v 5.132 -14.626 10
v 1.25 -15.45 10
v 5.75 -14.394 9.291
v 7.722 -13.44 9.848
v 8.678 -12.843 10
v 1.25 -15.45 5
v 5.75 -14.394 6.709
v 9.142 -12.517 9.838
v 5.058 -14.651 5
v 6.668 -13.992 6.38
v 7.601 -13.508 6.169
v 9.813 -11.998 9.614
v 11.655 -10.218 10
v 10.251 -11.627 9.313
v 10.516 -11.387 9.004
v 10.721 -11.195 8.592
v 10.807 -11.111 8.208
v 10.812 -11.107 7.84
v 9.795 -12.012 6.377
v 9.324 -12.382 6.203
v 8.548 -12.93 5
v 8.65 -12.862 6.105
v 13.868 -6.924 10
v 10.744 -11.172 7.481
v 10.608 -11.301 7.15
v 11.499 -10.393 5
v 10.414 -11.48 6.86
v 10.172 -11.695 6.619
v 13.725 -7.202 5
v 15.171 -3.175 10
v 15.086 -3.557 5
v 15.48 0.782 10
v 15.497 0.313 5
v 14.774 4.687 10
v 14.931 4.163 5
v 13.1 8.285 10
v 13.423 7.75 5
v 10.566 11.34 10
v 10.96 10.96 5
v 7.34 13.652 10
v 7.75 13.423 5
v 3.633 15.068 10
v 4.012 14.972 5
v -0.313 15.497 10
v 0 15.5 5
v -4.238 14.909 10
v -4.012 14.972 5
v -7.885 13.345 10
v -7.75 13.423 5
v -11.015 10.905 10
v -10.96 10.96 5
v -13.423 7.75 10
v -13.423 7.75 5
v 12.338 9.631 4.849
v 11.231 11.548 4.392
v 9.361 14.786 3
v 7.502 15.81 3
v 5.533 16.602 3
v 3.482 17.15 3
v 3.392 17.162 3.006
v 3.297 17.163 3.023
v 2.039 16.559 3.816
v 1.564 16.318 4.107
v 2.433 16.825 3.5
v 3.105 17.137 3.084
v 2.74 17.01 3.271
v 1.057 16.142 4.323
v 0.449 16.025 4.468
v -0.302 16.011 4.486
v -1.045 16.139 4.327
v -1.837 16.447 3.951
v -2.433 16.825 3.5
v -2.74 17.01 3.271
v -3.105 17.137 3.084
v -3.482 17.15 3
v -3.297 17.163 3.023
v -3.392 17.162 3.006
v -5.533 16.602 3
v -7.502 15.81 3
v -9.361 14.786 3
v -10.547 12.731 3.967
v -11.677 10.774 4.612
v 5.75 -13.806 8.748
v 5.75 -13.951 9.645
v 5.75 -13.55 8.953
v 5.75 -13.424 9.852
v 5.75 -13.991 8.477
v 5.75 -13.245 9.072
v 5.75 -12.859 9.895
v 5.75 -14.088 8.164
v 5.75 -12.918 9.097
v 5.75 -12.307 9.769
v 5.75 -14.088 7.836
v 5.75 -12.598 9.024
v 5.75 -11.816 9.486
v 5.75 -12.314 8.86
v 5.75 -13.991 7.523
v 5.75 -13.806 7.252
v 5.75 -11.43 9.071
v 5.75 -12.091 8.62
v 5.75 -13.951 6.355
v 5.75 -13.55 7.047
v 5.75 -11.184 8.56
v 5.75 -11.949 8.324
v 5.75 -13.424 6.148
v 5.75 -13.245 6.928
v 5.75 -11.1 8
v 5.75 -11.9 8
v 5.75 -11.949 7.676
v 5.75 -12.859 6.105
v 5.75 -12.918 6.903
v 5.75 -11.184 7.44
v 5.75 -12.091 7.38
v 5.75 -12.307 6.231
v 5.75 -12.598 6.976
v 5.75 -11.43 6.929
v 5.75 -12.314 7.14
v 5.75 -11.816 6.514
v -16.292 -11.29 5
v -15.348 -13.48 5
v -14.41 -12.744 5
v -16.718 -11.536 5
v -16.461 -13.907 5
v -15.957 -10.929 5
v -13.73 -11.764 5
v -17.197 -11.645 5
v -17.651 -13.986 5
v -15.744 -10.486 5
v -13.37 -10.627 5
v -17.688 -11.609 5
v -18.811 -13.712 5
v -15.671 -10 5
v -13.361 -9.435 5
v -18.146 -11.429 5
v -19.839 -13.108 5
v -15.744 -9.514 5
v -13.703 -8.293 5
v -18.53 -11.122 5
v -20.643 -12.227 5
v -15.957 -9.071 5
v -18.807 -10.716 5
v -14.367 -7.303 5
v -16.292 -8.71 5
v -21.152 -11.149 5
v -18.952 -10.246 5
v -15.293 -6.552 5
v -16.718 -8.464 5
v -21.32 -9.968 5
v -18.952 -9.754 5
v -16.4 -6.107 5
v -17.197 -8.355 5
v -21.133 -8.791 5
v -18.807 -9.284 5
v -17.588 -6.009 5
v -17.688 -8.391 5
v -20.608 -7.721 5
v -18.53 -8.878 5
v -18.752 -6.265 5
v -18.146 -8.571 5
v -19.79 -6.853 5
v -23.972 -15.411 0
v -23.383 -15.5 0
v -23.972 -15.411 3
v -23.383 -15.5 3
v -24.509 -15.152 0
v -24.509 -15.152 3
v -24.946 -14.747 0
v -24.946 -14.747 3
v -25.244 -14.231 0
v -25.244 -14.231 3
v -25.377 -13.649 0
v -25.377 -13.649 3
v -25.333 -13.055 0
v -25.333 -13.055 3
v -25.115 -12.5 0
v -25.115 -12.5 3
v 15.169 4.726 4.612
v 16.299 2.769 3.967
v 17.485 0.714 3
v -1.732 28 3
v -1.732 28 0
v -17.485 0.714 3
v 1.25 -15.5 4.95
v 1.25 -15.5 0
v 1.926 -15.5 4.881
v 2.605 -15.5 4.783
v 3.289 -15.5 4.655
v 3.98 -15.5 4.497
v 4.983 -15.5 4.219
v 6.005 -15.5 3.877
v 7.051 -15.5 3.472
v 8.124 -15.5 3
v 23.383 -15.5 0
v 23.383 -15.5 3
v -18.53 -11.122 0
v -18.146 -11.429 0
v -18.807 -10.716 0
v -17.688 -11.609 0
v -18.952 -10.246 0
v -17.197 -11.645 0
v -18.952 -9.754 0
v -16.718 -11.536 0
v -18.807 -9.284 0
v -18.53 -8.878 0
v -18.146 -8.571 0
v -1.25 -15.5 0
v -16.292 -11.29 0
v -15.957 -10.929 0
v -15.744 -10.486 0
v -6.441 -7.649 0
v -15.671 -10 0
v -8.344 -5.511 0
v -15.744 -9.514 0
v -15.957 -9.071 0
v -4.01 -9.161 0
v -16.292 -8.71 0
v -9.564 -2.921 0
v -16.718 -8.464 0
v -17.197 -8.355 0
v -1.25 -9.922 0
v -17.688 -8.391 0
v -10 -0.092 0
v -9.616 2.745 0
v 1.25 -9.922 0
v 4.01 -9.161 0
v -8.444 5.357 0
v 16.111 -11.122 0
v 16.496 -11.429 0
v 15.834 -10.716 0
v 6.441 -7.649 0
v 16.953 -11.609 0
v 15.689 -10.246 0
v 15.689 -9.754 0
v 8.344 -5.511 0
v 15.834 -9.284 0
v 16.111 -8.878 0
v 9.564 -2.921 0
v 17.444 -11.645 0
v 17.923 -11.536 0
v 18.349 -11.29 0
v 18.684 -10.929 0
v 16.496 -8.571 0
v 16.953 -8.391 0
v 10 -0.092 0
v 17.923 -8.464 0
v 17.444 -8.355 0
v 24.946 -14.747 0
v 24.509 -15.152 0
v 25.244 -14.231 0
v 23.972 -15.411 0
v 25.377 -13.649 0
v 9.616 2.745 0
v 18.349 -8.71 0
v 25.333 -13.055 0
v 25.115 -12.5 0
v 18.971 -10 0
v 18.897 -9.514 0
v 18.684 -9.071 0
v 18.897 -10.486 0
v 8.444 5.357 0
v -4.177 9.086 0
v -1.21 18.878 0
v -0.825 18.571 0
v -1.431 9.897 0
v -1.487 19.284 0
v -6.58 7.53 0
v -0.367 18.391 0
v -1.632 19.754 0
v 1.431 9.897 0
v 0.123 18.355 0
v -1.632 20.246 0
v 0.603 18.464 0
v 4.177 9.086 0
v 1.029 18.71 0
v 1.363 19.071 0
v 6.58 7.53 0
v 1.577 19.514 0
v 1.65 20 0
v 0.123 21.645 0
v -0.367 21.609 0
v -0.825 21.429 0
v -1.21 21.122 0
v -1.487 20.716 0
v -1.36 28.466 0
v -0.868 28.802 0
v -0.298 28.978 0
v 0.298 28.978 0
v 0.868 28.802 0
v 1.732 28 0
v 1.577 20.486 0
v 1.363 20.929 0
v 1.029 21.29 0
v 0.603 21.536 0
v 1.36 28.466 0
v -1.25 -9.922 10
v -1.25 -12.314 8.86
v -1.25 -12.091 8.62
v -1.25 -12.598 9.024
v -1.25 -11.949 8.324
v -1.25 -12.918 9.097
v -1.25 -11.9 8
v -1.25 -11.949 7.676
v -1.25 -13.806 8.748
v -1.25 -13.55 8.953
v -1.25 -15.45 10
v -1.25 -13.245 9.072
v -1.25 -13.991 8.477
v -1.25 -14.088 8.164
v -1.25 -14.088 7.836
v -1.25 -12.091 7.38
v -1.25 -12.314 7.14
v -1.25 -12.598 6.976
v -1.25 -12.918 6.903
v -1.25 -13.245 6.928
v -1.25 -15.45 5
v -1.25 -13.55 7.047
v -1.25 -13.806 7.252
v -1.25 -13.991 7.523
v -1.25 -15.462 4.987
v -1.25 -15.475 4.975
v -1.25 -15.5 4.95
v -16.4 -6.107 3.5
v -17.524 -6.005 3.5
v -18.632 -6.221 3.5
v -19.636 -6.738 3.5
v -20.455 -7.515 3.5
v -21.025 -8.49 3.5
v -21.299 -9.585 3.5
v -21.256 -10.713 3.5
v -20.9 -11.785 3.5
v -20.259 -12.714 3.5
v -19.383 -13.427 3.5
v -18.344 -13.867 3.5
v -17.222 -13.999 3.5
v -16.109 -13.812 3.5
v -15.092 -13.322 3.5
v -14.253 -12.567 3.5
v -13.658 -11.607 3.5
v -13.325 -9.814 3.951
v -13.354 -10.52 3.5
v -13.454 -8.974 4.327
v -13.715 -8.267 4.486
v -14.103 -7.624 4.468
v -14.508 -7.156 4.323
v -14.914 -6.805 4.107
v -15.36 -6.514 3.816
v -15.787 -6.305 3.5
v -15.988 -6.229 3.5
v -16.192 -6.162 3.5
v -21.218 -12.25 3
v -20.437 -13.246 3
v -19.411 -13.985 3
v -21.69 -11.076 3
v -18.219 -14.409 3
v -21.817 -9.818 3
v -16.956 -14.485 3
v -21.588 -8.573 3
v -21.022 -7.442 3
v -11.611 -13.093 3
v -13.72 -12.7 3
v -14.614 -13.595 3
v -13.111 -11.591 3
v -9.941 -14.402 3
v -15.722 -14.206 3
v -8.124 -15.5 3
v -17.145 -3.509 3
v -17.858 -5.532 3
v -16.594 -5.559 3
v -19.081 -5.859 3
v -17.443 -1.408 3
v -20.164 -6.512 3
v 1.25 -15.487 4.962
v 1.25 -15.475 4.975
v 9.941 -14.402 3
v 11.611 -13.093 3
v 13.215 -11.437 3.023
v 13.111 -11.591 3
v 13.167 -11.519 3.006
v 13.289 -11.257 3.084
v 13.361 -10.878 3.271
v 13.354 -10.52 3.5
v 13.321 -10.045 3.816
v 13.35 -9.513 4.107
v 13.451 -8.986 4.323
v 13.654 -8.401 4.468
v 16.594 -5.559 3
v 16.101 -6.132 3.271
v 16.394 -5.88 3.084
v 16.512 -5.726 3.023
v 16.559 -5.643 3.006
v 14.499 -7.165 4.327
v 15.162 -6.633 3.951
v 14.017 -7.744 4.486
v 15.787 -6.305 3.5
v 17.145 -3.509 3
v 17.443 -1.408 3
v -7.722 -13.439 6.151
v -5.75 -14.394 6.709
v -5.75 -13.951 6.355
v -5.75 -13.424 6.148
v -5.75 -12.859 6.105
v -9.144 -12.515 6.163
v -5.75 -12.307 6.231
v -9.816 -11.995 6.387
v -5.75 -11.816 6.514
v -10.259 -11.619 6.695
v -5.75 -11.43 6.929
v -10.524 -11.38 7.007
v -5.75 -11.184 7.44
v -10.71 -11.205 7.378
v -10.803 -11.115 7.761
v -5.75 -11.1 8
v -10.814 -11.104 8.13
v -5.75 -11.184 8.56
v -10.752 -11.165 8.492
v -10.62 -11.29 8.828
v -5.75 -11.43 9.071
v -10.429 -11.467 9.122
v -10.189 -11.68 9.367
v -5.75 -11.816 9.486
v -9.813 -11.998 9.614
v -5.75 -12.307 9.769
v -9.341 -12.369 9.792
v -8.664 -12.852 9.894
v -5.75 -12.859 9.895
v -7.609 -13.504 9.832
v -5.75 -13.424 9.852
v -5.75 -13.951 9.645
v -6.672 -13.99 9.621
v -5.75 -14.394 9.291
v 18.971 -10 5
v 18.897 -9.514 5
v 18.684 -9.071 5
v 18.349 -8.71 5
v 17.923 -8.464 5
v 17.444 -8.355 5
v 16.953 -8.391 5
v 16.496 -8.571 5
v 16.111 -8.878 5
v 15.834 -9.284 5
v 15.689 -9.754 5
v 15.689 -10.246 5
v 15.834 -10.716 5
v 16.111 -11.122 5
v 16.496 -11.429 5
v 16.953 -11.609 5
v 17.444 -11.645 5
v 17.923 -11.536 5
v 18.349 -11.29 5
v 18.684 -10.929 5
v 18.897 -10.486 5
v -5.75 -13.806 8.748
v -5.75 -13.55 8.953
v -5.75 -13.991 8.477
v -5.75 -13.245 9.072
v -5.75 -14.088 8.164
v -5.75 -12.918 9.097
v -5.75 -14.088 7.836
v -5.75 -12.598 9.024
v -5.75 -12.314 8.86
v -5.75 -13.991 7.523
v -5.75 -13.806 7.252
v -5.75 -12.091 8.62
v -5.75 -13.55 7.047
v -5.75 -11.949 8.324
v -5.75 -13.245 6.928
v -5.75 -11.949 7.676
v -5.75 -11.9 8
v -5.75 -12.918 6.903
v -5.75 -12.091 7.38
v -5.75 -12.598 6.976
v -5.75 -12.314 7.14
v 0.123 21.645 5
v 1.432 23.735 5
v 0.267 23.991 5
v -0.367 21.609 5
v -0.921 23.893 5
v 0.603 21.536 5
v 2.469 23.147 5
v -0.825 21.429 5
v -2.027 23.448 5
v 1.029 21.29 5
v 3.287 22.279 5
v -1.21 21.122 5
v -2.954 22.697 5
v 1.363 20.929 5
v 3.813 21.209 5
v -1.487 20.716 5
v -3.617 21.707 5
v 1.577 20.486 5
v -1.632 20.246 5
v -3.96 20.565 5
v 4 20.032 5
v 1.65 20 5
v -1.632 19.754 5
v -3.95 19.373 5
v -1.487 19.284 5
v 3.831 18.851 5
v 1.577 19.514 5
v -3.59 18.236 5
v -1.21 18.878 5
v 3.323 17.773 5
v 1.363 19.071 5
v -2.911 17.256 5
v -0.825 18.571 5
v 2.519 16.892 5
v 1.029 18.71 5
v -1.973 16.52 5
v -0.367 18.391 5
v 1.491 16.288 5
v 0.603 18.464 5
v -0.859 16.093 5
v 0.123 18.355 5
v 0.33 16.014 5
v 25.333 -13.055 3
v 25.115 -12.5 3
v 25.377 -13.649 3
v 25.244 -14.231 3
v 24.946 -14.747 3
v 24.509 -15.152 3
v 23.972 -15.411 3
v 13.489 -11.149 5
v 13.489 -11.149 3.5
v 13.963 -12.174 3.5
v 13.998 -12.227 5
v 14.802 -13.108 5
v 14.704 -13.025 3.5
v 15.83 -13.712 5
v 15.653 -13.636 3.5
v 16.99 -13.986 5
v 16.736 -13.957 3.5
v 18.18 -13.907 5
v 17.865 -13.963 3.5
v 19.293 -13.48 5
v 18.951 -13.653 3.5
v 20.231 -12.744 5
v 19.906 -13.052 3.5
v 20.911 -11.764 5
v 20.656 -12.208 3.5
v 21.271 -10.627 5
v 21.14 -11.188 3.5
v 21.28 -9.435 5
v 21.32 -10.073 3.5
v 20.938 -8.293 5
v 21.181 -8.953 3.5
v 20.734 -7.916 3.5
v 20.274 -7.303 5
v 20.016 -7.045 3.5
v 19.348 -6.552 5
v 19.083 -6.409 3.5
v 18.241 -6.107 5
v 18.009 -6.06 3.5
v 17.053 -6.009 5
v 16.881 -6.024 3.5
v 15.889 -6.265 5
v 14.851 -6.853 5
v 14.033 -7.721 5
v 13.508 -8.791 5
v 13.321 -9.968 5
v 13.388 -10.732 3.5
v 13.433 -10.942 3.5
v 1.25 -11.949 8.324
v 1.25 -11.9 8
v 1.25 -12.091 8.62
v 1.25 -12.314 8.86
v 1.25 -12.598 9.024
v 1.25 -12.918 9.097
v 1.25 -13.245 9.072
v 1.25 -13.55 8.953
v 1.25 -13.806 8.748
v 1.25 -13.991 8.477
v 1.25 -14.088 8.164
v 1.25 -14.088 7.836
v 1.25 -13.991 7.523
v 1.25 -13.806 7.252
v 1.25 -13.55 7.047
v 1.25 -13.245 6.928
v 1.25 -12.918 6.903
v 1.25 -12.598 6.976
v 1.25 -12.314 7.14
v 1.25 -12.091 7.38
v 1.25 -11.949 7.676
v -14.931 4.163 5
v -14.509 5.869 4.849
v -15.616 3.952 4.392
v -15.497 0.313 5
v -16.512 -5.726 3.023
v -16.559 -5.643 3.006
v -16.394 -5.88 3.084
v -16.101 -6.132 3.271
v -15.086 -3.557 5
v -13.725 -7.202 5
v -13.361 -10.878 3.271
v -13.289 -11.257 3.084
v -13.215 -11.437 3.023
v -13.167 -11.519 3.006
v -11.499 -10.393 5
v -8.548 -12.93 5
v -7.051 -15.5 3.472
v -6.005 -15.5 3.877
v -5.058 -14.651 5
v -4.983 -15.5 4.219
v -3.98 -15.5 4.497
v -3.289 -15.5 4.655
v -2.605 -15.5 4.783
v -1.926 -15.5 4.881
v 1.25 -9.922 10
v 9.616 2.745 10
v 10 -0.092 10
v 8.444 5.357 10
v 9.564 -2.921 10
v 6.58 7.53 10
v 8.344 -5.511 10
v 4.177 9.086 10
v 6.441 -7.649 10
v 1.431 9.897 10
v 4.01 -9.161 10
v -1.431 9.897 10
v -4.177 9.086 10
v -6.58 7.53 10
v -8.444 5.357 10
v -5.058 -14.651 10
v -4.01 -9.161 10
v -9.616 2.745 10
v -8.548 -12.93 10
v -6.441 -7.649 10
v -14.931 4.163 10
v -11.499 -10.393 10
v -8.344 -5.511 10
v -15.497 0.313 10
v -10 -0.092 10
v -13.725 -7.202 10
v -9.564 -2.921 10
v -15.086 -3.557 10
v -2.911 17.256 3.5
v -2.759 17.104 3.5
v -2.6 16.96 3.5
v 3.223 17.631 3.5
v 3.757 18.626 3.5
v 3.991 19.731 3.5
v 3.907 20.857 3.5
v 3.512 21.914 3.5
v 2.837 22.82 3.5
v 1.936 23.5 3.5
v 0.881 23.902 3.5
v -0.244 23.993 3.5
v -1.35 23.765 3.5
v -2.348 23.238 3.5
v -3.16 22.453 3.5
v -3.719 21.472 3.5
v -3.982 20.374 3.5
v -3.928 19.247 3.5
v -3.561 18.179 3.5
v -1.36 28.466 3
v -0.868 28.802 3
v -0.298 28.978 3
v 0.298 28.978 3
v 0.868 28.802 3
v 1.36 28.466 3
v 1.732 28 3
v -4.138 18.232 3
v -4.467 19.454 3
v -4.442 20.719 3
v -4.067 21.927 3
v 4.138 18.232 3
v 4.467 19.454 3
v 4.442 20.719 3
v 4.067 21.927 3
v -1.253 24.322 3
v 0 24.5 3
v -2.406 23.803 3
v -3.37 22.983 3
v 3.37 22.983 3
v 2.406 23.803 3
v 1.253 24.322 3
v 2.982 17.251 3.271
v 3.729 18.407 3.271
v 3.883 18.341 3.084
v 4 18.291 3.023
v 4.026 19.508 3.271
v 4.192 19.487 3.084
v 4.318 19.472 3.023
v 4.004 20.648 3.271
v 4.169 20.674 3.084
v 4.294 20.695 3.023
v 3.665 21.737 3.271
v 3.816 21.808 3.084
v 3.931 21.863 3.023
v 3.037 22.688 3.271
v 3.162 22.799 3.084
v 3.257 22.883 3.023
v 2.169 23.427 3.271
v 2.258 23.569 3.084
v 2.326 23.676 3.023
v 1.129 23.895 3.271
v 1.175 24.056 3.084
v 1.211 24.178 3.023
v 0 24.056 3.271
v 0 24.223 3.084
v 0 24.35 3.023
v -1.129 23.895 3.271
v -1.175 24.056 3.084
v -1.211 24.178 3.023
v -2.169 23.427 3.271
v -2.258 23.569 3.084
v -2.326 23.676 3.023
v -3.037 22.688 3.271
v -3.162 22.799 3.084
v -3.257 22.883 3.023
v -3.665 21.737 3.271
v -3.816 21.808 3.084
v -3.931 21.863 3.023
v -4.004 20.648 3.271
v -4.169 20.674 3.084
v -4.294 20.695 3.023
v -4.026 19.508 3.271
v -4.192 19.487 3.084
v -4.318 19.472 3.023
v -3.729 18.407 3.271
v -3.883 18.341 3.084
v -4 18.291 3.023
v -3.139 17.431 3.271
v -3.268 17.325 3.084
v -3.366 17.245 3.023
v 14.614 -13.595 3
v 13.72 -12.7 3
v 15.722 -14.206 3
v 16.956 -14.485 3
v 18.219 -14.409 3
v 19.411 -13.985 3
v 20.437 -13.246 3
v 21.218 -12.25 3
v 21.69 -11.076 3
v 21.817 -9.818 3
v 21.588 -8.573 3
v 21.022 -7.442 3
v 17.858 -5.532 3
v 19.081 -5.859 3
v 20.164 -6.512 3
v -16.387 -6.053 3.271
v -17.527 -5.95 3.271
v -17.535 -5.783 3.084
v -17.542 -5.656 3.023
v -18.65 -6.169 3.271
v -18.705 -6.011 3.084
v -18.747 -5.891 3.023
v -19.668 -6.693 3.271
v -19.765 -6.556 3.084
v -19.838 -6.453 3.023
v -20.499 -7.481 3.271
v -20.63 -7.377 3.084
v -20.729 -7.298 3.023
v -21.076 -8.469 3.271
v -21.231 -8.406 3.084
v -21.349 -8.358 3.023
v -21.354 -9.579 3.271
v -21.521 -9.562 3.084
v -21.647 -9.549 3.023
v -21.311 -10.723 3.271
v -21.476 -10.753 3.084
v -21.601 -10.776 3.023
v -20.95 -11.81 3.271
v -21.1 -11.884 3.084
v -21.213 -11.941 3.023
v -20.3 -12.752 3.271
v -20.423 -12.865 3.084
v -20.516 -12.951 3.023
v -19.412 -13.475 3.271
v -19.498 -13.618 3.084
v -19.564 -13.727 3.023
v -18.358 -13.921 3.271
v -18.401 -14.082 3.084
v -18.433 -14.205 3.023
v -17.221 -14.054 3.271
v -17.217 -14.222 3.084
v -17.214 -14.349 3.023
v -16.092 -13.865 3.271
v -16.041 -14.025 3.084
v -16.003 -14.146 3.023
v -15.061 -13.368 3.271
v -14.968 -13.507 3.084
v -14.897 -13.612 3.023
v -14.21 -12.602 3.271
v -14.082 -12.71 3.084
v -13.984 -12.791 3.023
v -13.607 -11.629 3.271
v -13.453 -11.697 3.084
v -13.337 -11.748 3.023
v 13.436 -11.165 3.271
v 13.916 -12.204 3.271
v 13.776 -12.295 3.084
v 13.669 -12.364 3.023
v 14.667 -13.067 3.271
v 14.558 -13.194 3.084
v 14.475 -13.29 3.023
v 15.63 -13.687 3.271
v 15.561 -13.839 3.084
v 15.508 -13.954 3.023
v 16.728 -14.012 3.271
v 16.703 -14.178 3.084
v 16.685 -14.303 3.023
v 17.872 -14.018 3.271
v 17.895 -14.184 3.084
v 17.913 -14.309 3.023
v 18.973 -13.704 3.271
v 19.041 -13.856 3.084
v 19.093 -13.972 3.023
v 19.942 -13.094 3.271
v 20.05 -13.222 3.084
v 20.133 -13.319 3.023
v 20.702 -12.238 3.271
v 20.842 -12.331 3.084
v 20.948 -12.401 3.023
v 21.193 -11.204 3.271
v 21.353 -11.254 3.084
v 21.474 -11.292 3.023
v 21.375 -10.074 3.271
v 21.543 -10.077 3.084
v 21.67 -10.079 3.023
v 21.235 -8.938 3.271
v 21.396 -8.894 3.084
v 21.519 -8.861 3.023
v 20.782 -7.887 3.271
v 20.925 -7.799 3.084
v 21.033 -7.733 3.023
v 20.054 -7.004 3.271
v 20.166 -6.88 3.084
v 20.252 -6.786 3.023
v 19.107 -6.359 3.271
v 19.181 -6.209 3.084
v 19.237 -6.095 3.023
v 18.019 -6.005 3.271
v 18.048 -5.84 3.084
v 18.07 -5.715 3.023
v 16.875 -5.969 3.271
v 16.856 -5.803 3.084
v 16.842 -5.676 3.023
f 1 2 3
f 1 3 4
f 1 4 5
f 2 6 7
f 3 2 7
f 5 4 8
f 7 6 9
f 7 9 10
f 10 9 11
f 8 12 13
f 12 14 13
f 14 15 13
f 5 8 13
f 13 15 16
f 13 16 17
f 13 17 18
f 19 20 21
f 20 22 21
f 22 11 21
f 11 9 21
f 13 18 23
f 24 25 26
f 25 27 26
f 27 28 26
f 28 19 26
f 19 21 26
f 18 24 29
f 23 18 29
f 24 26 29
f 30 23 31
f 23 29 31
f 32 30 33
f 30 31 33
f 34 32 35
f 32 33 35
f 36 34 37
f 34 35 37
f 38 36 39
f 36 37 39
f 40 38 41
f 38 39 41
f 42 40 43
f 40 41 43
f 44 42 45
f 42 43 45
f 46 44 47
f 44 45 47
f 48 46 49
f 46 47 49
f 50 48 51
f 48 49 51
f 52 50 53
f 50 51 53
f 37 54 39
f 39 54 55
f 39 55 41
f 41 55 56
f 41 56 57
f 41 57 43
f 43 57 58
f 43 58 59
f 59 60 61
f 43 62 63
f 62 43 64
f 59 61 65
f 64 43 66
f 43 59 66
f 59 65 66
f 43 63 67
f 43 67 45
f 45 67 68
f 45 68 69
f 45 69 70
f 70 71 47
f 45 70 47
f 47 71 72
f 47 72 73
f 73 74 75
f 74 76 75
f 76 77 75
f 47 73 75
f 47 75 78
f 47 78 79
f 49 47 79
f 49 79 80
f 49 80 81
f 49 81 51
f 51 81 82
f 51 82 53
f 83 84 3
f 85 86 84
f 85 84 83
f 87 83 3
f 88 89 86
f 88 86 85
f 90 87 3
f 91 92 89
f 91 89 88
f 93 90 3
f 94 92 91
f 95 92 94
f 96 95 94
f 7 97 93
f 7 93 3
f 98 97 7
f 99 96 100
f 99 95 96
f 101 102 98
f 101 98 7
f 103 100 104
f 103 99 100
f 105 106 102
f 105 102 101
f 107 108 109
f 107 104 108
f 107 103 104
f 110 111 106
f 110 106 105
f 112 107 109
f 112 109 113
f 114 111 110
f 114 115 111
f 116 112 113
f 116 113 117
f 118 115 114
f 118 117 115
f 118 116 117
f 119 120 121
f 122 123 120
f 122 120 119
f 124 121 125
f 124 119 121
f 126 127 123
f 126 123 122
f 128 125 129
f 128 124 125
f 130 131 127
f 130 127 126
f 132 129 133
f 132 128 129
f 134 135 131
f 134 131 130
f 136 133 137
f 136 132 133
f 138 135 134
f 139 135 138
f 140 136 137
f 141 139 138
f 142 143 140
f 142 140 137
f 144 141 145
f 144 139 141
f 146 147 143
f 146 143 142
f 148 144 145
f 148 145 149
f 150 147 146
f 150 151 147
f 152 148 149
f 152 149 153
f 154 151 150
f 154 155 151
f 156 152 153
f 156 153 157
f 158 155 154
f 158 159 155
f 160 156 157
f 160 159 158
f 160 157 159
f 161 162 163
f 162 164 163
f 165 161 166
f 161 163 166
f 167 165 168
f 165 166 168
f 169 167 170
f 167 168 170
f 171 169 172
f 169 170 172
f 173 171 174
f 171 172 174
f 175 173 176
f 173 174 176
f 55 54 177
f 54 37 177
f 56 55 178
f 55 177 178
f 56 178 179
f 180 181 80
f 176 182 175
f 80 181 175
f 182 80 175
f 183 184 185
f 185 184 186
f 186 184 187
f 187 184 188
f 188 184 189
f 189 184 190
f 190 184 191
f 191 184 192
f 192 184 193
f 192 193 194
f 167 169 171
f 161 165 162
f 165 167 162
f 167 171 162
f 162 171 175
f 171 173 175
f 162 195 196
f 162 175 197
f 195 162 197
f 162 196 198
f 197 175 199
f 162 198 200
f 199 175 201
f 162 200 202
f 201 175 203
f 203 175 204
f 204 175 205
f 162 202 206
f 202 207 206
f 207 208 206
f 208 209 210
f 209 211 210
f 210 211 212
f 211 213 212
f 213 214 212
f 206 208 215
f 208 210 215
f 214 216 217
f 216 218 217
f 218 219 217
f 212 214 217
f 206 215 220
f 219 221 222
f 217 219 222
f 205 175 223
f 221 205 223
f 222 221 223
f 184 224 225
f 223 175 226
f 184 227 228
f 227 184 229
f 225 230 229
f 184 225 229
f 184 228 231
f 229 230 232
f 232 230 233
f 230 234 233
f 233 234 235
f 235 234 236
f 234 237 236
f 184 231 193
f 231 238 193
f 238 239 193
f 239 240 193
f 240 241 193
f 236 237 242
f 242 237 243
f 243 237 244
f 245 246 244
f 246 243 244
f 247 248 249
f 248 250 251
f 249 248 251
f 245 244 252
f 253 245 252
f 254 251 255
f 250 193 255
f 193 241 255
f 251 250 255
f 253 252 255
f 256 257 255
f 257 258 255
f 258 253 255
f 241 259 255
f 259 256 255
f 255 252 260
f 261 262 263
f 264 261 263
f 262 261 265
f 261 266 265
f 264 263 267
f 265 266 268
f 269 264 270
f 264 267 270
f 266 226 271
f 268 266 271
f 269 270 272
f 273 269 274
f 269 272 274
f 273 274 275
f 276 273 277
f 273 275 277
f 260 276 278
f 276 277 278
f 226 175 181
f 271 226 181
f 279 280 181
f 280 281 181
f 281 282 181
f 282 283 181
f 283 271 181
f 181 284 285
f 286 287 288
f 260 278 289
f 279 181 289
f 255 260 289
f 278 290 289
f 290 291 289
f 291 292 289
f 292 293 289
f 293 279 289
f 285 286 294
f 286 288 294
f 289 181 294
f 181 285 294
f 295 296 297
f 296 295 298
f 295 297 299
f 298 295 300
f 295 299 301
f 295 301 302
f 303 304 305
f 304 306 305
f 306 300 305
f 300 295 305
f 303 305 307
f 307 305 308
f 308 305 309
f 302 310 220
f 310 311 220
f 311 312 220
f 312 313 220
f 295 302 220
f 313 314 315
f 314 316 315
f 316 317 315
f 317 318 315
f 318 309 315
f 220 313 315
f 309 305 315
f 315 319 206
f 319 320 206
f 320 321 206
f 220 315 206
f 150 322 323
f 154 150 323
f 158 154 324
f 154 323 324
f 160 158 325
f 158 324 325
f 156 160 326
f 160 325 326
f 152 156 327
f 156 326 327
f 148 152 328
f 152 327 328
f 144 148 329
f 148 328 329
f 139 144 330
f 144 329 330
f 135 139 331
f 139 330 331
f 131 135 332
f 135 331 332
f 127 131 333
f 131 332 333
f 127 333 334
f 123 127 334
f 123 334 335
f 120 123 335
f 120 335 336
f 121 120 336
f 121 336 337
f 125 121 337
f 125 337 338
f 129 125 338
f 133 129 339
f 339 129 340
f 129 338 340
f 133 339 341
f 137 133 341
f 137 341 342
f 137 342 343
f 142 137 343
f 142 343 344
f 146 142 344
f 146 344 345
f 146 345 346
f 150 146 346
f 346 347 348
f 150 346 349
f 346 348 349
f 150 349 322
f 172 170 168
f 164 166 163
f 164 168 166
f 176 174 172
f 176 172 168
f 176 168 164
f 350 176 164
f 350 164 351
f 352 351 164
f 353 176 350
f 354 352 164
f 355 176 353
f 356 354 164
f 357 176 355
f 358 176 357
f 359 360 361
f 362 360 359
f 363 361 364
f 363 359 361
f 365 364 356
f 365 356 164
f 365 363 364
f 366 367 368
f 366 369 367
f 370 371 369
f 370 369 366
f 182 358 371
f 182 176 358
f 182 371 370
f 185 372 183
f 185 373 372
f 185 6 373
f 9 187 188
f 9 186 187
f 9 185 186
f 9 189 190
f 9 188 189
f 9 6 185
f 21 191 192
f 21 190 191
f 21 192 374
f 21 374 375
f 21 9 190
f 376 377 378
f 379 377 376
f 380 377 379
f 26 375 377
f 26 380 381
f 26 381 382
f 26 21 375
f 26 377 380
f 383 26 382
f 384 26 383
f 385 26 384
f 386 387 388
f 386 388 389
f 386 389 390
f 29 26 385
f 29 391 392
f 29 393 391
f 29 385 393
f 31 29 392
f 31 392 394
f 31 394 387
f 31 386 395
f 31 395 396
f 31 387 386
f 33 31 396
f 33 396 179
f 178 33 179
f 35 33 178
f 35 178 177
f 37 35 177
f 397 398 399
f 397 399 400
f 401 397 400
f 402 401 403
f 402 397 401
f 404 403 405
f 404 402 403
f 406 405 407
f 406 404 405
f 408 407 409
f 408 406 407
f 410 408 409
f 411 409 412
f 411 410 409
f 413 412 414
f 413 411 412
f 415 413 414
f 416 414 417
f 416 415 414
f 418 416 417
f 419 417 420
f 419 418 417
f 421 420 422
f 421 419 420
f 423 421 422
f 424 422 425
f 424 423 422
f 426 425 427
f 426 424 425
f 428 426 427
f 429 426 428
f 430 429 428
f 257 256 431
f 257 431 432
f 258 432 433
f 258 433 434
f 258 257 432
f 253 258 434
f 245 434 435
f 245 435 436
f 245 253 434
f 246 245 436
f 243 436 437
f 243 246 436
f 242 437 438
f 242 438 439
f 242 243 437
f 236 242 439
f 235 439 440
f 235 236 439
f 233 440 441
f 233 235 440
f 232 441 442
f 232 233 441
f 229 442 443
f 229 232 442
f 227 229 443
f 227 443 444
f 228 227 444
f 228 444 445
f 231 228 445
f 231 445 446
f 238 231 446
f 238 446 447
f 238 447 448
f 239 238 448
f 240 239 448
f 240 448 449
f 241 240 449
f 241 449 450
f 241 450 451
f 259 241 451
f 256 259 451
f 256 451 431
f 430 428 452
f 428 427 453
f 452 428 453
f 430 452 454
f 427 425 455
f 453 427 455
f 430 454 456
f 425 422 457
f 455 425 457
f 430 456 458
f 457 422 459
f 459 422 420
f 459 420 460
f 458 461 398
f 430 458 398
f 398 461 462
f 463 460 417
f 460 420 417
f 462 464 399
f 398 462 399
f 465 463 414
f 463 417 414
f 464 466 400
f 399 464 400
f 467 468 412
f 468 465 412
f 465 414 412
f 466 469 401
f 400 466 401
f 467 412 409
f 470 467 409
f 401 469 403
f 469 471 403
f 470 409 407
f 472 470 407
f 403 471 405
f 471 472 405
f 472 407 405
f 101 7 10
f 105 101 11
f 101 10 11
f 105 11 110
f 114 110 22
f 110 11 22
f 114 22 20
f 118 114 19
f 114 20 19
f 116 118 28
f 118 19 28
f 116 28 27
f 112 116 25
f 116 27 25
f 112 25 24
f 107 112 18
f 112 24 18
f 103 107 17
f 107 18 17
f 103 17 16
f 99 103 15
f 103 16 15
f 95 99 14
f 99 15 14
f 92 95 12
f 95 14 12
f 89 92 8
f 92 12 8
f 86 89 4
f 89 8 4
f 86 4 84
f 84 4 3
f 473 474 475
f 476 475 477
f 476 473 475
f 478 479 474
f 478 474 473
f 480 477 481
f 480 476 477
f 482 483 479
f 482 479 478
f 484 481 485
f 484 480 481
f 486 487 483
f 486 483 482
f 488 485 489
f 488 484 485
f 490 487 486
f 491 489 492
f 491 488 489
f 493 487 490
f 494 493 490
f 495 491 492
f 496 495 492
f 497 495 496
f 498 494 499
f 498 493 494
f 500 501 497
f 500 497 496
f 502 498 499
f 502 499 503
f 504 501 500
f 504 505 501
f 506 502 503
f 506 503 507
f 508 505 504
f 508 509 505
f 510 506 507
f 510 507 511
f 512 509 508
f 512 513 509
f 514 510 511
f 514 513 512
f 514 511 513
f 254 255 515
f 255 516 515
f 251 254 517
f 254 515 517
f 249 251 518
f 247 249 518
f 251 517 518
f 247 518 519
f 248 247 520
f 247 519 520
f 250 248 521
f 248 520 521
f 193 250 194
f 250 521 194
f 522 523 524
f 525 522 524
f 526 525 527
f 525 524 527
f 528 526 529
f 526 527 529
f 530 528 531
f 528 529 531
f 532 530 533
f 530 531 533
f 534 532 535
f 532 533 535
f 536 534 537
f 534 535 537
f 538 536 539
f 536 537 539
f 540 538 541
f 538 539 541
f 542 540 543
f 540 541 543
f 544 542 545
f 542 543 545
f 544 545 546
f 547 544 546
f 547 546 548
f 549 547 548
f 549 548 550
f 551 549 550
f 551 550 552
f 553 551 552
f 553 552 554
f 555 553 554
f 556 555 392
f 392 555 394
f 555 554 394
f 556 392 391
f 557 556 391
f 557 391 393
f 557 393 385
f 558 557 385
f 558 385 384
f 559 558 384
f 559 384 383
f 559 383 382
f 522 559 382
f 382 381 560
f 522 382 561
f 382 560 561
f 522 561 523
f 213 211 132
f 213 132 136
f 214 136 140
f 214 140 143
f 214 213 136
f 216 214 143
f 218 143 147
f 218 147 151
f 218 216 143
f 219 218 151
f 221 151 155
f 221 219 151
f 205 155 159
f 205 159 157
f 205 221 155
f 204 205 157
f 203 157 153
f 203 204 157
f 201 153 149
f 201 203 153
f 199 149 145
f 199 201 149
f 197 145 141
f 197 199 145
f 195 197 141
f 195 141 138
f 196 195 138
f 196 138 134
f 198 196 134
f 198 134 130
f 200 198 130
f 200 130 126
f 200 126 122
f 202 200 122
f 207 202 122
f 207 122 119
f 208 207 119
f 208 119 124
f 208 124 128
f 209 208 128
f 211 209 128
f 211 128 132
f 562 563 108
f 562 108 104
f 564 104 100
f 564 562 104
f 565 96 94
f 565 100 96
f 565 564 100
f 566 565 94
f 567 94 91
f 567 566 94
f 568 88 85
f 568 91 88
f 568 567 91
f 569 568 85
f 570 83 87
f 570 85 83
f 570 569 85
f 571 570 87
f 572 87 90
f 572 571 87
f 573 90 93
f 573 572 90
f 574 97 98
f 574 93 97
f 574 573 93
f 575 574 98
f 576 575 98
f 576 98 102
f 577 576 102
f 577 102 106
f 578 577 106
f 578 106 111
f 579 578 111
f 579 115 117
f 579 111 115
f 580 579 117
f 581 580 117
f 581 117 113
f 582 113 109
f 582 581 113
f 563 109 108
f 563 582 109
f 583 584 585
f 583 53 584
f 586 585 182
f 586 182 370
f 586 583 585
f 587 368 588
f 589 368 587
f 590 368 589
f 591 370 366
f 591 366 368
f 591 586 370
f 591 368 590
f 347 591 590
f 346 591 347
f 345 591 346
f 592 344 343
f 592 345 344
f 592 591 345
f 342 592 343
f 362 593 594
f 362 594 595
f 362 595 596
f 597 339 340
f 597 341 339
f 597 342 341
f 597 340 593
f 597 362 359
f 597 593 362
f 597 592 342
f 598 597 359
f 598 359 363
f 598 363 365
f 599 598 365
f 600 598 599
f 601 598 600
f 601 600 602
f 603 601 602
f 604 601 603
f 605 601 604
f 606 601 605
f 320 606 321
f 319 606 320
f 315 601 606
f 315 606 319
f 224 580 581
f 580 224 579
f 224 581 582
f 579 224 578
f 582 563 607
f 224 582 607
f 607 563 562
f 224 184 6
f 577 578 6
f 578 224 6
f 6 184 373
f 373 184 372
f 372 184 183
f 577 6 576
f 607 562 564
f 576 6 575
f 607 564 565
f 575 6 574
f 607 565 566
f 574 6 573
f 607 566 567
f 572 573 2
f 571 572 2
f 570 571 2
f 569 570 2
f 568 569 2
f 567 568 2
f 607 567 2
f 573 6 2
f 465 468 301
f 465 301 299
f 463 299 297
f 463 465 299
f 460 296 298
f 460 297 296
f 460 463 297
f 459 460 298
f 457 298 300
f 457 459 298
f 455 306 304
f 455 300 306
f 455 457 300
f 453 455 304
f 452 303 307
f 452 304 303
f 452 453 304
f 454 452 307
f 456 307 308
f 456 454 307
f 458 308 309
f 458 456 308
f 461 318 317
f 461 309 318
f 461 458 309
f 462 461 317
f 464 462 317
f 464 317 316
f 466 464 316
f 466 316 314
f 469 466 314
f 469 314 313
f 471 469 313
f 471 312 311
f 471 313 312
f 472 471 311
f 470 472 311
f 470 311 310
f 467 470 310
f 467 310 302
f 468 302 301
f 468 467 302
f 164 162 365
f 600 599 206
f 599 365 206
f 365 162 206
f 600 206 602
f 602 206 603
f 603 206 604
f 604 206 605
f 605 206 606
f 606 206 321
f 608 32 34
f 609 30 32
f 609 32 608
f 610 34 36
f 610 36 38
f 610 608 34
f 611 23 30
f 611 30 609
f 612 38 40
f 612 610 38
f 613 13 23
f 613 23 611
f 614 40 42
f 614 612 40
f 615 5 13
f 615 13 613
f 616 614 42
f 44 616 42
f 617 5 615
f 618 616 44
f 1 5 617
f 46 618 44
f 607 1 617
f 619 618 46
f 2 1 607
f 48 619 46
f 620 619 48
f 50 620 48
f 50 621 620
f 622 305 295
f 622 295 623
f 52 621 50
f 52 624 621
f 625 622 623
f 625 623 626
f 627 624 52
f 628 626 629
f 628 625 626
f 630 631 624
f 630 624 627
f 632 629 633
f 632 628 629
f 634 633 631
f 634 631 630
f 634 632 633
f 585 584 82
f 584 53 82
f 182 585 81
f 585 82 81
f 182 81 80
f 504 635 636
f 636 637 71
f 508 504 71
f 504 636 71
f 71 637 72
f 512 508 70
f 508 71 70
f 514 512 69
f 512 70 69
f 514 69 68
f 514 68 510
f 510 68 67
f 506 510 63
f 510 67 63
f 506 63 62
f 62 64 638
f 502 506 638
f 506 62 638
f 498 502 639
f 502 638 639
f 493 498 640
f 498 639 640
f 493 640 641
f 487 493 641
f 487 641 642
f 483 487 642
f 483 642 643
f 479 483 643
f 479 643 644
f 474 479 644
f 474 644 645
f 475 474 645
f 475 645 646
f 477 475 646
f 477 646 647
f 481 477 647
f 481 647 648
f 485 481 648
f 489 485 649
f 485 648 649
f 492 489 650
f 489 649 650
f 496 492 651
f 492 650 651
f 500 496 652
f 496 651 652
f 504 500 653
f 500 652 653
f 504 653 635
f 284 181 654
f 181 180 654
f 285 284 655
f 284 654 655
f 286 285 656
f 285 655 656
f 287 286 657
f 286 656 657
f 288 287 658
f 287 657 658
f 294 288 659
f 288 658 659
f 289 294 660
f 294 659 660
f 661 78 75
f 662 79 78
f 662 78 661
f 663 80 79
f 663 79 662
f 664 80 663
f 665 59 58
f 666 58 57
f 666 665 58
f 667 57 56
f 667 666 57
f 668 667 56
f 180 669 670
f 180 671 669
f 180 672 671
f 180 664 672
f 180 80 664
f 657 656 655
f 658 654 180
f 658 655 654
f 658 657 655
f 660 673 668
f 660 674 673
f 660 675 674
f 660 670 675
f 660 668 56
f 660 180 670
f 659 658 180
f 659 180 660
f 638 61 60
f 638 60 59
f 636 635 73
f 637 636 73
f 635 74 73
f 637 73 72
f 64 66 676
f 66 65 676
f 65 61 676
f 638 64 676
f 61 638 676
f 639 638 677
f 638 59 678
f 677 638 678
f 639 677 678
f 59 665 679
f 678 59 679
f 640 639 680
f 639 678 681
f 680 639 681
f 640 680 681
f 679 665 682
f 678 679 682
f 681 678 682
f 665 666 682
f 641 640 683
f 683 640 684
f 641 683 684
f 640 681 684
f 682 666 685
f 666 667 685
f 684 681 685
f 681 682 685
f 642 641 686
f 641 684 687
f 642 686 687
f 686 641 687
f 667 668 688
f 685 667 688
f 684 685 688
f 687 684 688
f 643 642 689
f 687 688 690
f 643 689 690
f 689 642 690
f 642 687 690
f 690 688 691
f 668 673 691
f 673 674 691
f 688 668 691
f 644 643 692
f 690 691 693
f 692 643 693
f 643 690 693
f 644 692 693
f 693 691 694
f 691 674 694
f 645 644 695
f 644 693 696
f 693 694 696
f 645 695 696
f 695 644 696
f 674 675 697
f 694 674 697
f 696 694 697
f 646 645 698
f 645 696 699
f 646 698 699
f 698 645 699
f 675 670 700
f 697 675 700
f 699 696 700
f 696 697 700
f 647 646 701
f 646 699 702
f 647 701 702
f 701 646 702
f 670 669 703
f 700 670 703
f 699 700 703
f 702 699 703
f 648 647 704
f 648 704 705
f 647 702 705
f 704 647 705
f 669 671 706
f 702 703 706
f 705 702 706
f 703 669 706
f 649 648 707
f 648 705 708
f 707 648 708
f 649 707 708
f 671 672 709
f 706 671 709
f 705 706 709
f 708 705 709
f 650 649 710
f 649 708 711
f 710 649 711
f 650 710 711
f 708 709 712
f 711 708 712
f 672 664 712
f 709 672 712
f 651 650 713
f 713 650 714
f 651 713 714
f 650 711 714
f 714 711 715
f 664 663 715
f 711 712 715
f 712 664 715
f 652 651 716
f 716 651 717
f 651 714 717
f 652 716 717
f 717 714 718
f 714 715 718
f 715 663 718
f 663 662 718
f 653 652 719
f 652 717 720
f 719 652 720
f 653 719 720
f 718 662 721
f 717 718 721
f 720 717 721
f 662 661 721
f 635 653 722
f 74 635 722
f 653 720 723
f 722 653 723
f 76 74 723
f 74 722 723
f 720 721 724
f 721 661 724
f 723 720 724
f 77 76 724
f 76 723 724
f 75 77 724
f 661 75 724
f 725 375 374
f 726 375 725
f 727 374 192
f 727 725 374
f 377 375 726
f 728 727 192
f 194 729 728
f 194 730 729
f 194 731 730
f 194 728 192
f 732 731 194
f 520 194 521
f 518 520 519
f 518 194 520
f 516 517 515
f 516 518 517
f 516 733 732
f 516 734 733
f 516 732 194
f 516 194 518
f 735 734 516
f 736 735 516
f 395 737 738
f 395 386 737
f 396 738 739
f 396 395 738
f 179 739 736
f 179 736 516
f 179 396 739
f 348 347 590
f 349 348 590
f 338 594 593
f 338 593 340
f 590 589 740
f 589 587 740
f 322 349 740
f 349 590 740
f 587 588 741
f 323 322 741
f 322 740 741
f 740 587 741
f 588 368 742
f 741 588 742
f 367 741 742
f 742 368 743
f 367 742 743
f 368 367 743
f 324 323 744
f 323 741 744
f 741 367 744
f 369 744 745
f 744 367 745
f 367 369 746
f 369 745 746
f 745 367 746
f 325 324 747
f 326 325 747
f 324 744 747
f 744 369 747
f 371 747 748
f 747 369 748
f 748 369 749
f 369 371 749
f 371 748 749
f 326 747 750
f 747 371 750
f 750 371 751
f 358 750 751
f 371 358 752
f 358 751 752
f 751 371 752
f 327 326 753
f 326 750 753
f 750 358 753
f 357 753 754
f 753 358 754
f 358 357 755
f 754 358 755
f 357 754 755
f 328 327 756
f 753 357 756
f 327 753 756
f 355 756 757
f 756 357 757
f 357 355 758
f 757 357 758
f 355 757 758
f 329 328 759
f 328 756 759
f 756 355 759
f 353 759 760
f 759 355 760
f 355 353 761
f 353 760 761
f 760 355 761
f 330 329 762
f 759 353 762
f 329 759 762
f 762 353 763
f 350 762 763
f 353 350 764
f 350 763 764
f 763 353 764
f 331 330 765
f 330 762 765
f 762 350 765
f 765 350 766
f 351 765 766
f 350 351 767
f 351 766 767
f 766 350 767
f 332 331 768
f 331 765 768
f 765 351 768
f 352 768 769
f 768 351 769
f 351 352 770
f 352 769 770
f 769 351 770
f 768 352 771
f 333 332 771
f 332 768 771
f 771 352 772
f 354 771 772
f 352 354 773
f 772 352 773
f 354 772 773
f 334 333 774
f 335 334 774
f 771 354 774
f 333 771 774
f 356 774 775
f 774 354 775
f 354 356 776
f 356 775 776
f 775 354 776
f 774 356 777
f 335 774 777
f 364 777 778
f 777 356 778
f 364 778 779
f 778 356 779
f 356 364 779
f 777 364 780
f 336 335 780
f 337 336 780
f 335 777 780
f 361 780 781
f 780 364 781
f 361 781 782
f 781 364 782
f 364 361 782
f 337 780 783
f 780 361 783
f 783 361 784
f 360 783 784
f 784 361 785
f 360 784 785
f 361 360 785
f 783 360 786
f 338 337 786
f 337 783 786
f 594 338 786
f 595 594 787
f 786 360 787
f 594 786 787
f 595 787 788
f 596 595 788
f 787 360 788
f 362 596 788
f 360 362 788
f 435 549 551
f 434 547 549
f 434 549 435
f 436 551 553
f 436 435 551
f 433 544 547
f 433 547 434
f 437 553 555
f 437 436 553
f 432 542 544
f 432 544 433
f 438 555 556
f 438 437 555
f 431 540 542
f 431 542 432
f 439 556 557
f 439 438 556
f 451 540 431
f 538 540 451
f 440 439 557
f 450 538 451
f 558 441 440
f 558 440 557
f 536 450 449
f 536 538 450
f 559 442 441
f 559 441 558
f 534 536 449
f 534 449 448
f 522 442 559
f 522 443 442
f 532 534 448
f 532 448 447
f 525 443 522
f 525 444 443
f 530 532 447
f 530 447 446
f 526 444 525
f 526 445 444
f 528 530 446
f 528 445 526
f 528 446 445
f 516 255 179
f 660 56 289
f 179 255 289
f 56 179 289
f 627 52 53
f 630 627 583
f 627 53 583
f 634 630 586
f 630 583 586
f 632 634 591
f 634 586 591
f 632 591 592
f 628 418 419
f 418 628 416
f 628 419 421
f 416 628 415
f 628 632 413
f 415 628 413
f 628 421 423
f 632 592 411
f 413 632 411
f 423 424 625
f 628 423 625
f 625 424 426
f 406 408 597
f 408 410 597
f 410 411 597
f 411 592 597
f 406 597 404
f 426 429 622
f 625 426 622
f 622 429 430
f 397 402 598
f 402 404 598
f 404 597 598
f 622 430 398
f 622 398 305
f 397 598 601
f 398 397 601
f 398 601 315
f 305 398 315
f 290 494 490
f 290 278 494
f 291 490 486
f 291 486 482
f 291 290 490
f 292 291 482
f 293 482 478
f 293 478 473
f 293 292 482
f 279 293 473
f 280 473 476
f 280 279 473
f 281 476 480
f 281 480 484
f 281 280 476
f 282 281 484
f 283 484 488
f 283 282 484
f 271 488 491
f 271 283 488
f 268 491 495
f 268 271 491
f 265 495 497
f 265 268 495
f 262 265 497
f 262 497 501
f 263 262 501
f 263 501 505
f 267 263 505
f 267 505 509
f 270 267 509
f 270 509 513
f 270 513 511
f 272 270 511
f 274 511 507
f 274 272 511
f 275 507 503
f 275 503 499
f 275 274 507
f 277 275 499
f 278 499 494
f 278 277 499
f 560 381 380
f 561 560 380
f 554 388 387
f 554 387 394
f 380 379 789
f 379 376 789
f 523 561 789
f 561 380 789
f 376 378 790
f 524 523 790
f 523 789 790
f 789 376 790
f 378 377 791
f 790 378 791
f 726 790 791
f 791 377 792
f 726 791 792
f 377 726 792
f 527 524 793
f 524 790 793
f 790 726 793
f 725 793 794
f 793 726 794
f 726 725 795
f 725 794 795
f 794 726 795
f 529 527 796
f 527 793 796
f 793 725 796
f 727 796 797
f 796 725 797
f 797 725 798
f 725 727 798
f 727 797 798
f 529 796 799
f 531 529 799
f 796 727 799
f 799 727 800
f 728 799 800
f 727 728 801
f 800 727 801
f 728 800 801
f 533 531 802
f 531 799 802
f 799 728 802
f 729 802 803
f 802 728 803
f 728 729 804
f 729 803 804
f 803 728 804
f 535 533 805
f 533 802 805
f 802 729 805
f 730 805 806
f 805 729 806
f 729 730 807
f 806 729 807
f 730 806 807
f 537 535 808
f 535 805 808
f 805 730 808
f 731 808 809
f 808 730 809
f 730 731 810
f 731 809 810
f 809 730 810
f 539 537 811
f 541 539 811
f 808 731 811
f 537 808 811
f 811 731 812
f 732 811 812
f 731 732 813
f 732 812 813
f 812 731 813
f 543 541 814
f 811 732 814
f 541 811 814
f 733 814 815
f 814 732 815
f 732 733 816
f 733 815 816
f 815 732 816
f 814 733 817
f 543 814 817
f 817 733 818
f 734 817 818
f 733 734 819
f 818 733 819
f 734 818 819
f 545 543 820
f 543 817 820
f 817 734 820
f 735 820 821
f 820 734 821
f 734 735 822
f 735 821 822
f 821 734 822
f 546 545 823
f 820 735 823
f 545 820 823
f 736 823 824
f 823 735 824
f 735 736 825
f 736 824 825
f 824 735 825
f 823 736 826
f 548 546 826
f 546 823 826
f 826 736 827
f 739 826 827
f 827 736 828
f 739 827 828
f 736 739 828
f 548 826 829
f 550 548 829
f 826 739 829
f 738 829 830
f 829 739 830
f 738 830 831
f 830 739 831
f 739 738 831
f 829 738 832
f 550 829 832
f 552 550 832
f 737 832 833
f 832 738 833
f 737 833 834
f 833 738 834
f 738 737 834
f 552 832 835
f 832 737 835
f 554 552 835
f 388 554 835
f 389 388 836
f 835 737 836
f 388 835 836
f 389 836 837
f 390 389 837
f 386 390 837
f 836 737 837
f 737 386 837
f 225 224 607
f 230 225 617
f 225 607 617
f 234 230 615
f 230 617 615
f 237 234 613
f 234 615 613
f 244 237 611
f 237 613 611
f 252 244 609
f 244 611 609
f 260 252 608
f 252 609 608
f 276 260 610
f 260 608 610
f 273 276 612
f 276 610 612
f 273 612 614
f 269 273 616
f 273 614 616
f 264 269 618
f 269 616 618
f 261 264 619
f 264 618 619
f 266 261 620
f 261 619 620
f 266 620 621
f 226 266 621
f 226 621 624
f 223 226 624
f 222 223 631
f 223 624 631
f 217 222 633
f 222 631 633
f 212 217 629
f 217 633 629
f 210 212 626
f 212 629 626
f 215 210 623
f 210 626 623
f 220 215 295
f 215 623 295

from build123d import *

# Parameters (mm, degrees)
SKETCH_1_R               = 1.65
SKETCH_1_R_2             = 9
EXTRUDE_1_DEPTH          = 3
SKETCH_2_R               = 15.5
SKETCH_2_R_2             = 9
EXTRUDE_2_DEPTH          = 7
SKETCH_3_W               = 2.5
SKETCH_3_H               = 20
CUT_EXTRUDE_1_DEPTH      = 28
CUT_EXTRUDE_2_DEPTH      = 44.016618519
CUT_EXTRUDE_2_DEPTH_BACK = 44.016618519
SKETCH_4_R               = 1.1
SKETCH_5_R               = 10
CUT_EXTRUDE_3_DEPTH      = 43.210780613
SKETCH_6_R               = 1.9
CUT_EXTRUDE_8_DEPTH      = 13
CHAMFER_1_SIZE           = 2
FILLET_2_R               = 2
SKETCH_7_R               = 4
SKETCH_7_R_2             = 1.65
EXTRUDE_3_DEPTH          = 2
FILLET_3_R               = 0.5


with BuildPart() as part:
    # 草图1 → 凸台-拉伸1 (new body)
    with BuildSketch(Plane.XY):
        Polygon((0, 31), (-26.846787517, -15.5), (26.846787517, -15.5), align=None)
        with Locations((0, 20)):
            Circle(SKETCH_1_R, mode=Mode.SUBTRACT)
        with Locations((17.320508076, -10)):
            Circle(SKETCH_1_R, mode=Mode.SUBTRACT)
        with Locations((-17.320508076, -10)):
            Circle(SKETCH_1_R, mode=Mode.SUBTRACT)
        Circle(SKETCH_1_R_2, mode=Mode.SUBTRACT)
    extrude(amount=EXTRUDE_1_DEPTH)

    # 草图2 → 凸台-拉伸2 (add)
    with BuildSketch(Plane.XY.offset(3)):
        with Locations(Location((0, 0, 0), (0, 0, 150))):
            Circle(SKETCH_2_R)
        Circle(SKETCH_2_R_2, mode=Mode.SUBTRACT)
    extrude(amount=EXTRUDE_2_DEPTH)

    # 草图3 → 切除-拉伸1 (cut)
    with BuildSketch(Plane.XY.offset(10)):
        with Locations((0, -9)):
            Rectangle(SKETCH_3_W, SKETCH_3_H)
    extrude(amount=-CUT_EXTRUDE_1_DEPTH, mode=Mode.SUBTRACT)

    # 草图4 → 切除-拉伸2 (cut, two sides: drawn at the far end of the back side and taken through both)
    with BuildSketch(Plane(origin=(-1.25, 0, 0), x_dir=(0, 0, -1), z_dir=(1, 0, 0)).offset(-CUT_EXTRUDE_2_DEPTH_BACK)):
        with Locations(Location((-8, -13, 0), (0, 0, 90))):
            Circle(SKETCH_4_R)
    extrude(amount=CUT_EXTRUDE_2_DEPTH + CUT_EXTRUDE_2_DEPTH_BACK, mode=Mode.SUBTRACT)

    # 草图5 → 切除-拉伸3 (cut, through all)
    with BuildSketch(Plane.XY.offset(10)):
        Circle(SKETCH_5_R)
    extrude(amount=-CUT_EXTRUDE_3_DEPTH, mode=Mode.SUBTRACT)

    # 草图6 → 切除-拉伸8 (cut)
    with BuildSketch(Plane(origin=(18.75, 0, 0), x_dir=(0, 0, -1), z_dir=(1, 0, 0))):
        with Locations((-8, -13)):
            Circle(SKETCH_6_R)
    cut_extrude_8 = extrude(amount=-CUT_EXTRUDE_8_DEPTH, mode=Mode.SUBTRACT)

    # 镜向1: 切除-拉伸8 across plane
    add(cut_extrude_8.mirror(Plane(origin=(0, 0, 0), x_dir=(0, 0, 1), z_dir=(1, 0, 0))), mode=Mode.SUBTRACT)

    # 倒角1
    # the kernel refuses this chamfer: 2 mm, written as the material it adds along each edge
    with BuildSketch(Plane(origin=(0, 0, 3), x_dir=(-0.24867915141291427, -0.9685859175378057, 0), z_dir=(-0.9685859175378057, 0.24867915141291427, 0))) as chamfer_1_piece_1_section:
        Polygon((15.5 + CHAMFER_1_SIZE, 0), (15.5, CHAMFER_1_SIZE), (15.5, 0), align=None)
    chamfer_1_piece_1 = revolve(axis=Axis((0, 0, 3), (0, 0, 1)), revolution_arc=134.399365049, mode=Mode.PRIVATE)
    chamfer_1_piece_1 = split(chamfer_1_piece_1, bisect_by=Plane(origin=(-1.25, -15.346279834, 3.925823909), z_dir=(-1, 0, 0)), keep=Keep.TOP, mode=Mode.PRIVATE)
    chamfer_1_piece_1 = split(chamfer_1_piece_1, bisect_by=Plane(origin=(-2.983750464, -15.5, 3.925823909), z_dir=(0, 1, 0)), keep=Keep.TOP, mode=Mode.PRIVATE)
    add(chamfer_1_piece_1)
    with BuildSketch(Plane(origin=(0, 0, 3), x_dir=(-0.24867915141291427, -0.9685859175378057, 0), z_dir=(-0.9685859175378057, 0.24867915141291427, 0))) as chamfer_1_piece_2_section:
        Polygon((15.5 + CHAMFER_1_SIZE, 0), (15.5, CHAMFER_1_SIZE), (15.5, 0), align=None)
    chamfer_1_piece_2 = revolve(axis=Axis((0, 0, 3), (0, 0, 1)), revolution_arc=134.399365049, mode=Mode.PRIVATE)
    chamfer_1_piece_2 = split(chamfer_1_piece_2, bisect_by=Plane(origin=(1.25, -7.656401186, 3.97388988), z_dir=(1, 0, 0)), keep=Keep.TOP, mode=Mode.PRIVATE)
    chamfer_1_piece_2 = split(chamfer_1_piece_2, bisect_by=Plane(origin=(14.586588654, -15.5, 3.97388988), z_dir=(0, 1, 0)), keep=Keep.TOP, mode=Mode.PRIVATE)
    chamfer_1_piece_2 = split(chamfer_1_piece_2, bisect_by=Plane(origin=(20.385359887, -4.308479054, 3.97388988), z_dir=(-0.8660254037844387, -0.5000000000000001, 0)), keep=Keep.TOP, mode=Mode.PRIVATE)
    add(chamfer_1_piece_2)
    with BuildSketch(Plane(origin=(0, 0, 3), x_dir=(-0.8660254037844386, 0.4999999999999999, 0), z_dir=(0.4999999999999999, 0.8660254037844386, 0))) as chamfer_1_piece_3_section:
        Polygon((15.5 + CHAMFER_1_SIZE, 0), (15.5, CHAMFER_1_SIZE), (15.5, 0), align=None)
    chamfer_1_piece_3 = revolve(axis=Axis((0, 0, 3), (0, 0, 1)), revolution_arc=134.399364936, mode=Mode.PRIVATE)
    chamfer_1_piece_3 = split(chamfer_1_piece_3, bisect_by=Plane(origin=(-20.385359891, -4.308479063, 3.973889878), z_dir=(0.8660254037844387, -0.5000000000000001, 0)), keep=Keep.TOP, mode=Mode.PRIVATE)
    chamfer_1_piece_3 = split(chamfer_1_piece_3, bisect_by=Plane(origin=(-1.25, -7.656401201, 3.973889878), z_dir=(-1, 0, 0)), keep=Keep.TOP, mode=Mode.PRIVATE)
    chamfer_1_piece_3 = split(chamfer_1_piece_3, bisect_by=Plane(origin=(-14.586588647, -15.5, 3.973889878), z_dir=(0, 1, 0)), keep=Keep.TOP, mode=Mode.PRIVATE)
    add(chamfer_1_piece_3)
    with BuildSketch(Plane(origin=(0, 0, 3), x_dir=(-0.8660254037844386, 0.4999999999999999, 0), z_dir=(0.4999999999999999, 0.8660254037844386, 0))) as chamfer_1_piece_4_section:
        Polygon((15.5 + CHAMFER_1_SIZE, 0), (15.5, CHAMFER_1_SIZE), (15.5, 0), align=None)
    chamfer_1_piece_4 = revolve(axis=Axis((0, 0, 3), (0, 0, 1)), revolution_arc=134.399364936, mode=Mode.PRIVATE)
    chamfer_1_piece_4 = split(chamfer_1_piece_4, bisect_by=Plane(origin=(1.25, -15.346279834, 3.925823908), z_dir=(1, 0, 0)), keep=Keep.TOP, mode=Mode.PRIVATE)
    chamfer_1_piece_4 = split(chamfer_1_piece_4, bisect_by=Plane(origin=(2.983750464, -15.5, 3.925823908), z_dir=(0, 1, 0)), keep=Keep.TOP, mode=Mode.PRIVATE)
    add(chamfer_1_piece_4)
    with BuildSketch(Plane(origin=(0, 0, 3), x_dir=(0.8660254027930385, 0.5000000017171554, 0), z_dir=(0.5000000017171554, -0.8660254027930385, 0))) as chamfer_1_piece_5_section:
        Polygon((15.5, CHAMFER_1_SIZE), (15.5 + CHAMFER_1_SIZE, 0), (15.5, 0), align=None)
    chamfer_1_piece_5 = revolve(axis=Axis((0, 0, 3), (0, 0, 1)), revolution_arc=119.999999886, mode=Mode.PRIVATE)
    chamfer_1_piece_5 = split(chamfer_1_piece_5, bisect_by=Plane(origin=(-6.289993318, 20.105411993, 3.973882667), z_dir=(0.8660254037844387, -0.5000000000000001, 0)), keep=Keep.TOP, mode=Mode.PRIVATE)
    chamfer_1_piece_5 = split(chamfer_1_piece_5, bisect_by=Plane(origin=(6.28999331, 20.105412007, 3.973882667), z_dir=(-0.8660254037844387, -0.5000000000000001, 0)), keep=Keep.TOP, mode=Mode.PRIVATE)
    add(chamfer_1_piece_5)

    # 圆角2
    fillet_2_edges = [part.edges().sort_by_distance(p)[0] for p in [
        (26.846787517, -15.5, 1.5),
        (-26.846787517, -15.5, 1.5),
        (0, 31, 1.5),
    ]]
    fillet(fillet_2_edges, radius=FILLET_2_R)

    # 草图7 → 凸台-拉伸3 (add)
    # profile 1 of 3: a face of its own
    with BuildSketch(Plane.XY.offset(3)):
        with Locations(Location((0, 20, 0), (0, 0, 223.309380883))):
            Circle(SKETCH_7_R)
        with Locations((0, 20)):
            Circle(SKETCH_7_R_2, mode=Mode.SUBTRACT)
    # profile 2 of 3: a face of its own
    with BuildSketch(Plane.XY.offset(3)):
        with Locations(Location((17.320508076, -10, 0), (0, 0, 196.690618915))):
            Circle(SKETCH_7_R)
        with Locations((17.320508076, -10)):
            Circle(SKETCH_7_R_2, mode=Mode.SUBTRACT)
    # profile 3 of 3: a face of its own
    with BuildSketch(Plane.XY.offset(3)):
        with Locations(Location((-17.320508076, -10, 0), (0, 0, 76.690618915))):
            Circle(SKETCH_7_R)
        with Locations((-17.320508076, -10)):
            Circle(SKETCH_7_R_2, mode=Mode.SUBTRACT)
    extrude(amount=EXTRUDE_3_DEPTH)

    # 圆角3
    # the kernel refuses this fillet: 0.5 mm, written as the material it adds along each edge
    with BuildSketch(Plane(origin=(-17.320508076, -10, 3), x_dir=(0.5191846053523372, 0.854662123628477, 0), z_dir=(0.854662123628477, -0.5191846053523372, 0))) as fillet_3_piece_1:
        with BuildLine():
            CenterArc((4 + FILLET_3_R, FILLET_3_R), FILLET_3_R, 180, 90)
            Line((4 + FILLET_3_R, 0), (4, 0))
            Line((4, 0), (4, FILLET_3_R))
        make_face()
    revolve(axis=Axis((-17.320508076, -10, 3), (0, 0, 1)), revolution_arc=302.555144431)
    with BuildSketch(Plane(origin=(17.320508076, -10, 3), x_dir=(-0.9997514133907861, 0.022295995674683326, 0), z_dir=(0.022295995674683326, 0.9997514133907861, 0))) as fillet_3_piece_2:
        with BuildLine():
            CenterArc((4 + FILLET_3_R, FILLET_3_R), FILLET_3_R, 180, 90)
            Line((4, FILLET_3_R), (4, 0))
            Line((4, 0), (4 + FILLET_3_R, 0))
        make_face()
    revolve(axis=Axis((17.320508076, -10, 3), (0, 0, 1)), revolution_arc=302.555144431)
    with BuildSketch(Plane(origin=(0, 20, 3), x_dir=(0.4805668111313066, -0.8769581176082967, 0), z_dir=(-0.8769581176082967, -0.4805668111313066, 0))) as fillet_3_piece_3:
        with BuildLine():
            CenterArc((4 + FILLET_3_R, FILLET_3_R), FILLET_3_R, 180, 90)
            Line((4 + FILLET_3_R, 0), (4, 0))
            Line((4, 0), (4, FILLET_3_R))
        make_face()
    revolve(axis=Axis((0, 20, 3), (0, 0, 1)), revolution_arc=302.555144229)


solid = part.part
